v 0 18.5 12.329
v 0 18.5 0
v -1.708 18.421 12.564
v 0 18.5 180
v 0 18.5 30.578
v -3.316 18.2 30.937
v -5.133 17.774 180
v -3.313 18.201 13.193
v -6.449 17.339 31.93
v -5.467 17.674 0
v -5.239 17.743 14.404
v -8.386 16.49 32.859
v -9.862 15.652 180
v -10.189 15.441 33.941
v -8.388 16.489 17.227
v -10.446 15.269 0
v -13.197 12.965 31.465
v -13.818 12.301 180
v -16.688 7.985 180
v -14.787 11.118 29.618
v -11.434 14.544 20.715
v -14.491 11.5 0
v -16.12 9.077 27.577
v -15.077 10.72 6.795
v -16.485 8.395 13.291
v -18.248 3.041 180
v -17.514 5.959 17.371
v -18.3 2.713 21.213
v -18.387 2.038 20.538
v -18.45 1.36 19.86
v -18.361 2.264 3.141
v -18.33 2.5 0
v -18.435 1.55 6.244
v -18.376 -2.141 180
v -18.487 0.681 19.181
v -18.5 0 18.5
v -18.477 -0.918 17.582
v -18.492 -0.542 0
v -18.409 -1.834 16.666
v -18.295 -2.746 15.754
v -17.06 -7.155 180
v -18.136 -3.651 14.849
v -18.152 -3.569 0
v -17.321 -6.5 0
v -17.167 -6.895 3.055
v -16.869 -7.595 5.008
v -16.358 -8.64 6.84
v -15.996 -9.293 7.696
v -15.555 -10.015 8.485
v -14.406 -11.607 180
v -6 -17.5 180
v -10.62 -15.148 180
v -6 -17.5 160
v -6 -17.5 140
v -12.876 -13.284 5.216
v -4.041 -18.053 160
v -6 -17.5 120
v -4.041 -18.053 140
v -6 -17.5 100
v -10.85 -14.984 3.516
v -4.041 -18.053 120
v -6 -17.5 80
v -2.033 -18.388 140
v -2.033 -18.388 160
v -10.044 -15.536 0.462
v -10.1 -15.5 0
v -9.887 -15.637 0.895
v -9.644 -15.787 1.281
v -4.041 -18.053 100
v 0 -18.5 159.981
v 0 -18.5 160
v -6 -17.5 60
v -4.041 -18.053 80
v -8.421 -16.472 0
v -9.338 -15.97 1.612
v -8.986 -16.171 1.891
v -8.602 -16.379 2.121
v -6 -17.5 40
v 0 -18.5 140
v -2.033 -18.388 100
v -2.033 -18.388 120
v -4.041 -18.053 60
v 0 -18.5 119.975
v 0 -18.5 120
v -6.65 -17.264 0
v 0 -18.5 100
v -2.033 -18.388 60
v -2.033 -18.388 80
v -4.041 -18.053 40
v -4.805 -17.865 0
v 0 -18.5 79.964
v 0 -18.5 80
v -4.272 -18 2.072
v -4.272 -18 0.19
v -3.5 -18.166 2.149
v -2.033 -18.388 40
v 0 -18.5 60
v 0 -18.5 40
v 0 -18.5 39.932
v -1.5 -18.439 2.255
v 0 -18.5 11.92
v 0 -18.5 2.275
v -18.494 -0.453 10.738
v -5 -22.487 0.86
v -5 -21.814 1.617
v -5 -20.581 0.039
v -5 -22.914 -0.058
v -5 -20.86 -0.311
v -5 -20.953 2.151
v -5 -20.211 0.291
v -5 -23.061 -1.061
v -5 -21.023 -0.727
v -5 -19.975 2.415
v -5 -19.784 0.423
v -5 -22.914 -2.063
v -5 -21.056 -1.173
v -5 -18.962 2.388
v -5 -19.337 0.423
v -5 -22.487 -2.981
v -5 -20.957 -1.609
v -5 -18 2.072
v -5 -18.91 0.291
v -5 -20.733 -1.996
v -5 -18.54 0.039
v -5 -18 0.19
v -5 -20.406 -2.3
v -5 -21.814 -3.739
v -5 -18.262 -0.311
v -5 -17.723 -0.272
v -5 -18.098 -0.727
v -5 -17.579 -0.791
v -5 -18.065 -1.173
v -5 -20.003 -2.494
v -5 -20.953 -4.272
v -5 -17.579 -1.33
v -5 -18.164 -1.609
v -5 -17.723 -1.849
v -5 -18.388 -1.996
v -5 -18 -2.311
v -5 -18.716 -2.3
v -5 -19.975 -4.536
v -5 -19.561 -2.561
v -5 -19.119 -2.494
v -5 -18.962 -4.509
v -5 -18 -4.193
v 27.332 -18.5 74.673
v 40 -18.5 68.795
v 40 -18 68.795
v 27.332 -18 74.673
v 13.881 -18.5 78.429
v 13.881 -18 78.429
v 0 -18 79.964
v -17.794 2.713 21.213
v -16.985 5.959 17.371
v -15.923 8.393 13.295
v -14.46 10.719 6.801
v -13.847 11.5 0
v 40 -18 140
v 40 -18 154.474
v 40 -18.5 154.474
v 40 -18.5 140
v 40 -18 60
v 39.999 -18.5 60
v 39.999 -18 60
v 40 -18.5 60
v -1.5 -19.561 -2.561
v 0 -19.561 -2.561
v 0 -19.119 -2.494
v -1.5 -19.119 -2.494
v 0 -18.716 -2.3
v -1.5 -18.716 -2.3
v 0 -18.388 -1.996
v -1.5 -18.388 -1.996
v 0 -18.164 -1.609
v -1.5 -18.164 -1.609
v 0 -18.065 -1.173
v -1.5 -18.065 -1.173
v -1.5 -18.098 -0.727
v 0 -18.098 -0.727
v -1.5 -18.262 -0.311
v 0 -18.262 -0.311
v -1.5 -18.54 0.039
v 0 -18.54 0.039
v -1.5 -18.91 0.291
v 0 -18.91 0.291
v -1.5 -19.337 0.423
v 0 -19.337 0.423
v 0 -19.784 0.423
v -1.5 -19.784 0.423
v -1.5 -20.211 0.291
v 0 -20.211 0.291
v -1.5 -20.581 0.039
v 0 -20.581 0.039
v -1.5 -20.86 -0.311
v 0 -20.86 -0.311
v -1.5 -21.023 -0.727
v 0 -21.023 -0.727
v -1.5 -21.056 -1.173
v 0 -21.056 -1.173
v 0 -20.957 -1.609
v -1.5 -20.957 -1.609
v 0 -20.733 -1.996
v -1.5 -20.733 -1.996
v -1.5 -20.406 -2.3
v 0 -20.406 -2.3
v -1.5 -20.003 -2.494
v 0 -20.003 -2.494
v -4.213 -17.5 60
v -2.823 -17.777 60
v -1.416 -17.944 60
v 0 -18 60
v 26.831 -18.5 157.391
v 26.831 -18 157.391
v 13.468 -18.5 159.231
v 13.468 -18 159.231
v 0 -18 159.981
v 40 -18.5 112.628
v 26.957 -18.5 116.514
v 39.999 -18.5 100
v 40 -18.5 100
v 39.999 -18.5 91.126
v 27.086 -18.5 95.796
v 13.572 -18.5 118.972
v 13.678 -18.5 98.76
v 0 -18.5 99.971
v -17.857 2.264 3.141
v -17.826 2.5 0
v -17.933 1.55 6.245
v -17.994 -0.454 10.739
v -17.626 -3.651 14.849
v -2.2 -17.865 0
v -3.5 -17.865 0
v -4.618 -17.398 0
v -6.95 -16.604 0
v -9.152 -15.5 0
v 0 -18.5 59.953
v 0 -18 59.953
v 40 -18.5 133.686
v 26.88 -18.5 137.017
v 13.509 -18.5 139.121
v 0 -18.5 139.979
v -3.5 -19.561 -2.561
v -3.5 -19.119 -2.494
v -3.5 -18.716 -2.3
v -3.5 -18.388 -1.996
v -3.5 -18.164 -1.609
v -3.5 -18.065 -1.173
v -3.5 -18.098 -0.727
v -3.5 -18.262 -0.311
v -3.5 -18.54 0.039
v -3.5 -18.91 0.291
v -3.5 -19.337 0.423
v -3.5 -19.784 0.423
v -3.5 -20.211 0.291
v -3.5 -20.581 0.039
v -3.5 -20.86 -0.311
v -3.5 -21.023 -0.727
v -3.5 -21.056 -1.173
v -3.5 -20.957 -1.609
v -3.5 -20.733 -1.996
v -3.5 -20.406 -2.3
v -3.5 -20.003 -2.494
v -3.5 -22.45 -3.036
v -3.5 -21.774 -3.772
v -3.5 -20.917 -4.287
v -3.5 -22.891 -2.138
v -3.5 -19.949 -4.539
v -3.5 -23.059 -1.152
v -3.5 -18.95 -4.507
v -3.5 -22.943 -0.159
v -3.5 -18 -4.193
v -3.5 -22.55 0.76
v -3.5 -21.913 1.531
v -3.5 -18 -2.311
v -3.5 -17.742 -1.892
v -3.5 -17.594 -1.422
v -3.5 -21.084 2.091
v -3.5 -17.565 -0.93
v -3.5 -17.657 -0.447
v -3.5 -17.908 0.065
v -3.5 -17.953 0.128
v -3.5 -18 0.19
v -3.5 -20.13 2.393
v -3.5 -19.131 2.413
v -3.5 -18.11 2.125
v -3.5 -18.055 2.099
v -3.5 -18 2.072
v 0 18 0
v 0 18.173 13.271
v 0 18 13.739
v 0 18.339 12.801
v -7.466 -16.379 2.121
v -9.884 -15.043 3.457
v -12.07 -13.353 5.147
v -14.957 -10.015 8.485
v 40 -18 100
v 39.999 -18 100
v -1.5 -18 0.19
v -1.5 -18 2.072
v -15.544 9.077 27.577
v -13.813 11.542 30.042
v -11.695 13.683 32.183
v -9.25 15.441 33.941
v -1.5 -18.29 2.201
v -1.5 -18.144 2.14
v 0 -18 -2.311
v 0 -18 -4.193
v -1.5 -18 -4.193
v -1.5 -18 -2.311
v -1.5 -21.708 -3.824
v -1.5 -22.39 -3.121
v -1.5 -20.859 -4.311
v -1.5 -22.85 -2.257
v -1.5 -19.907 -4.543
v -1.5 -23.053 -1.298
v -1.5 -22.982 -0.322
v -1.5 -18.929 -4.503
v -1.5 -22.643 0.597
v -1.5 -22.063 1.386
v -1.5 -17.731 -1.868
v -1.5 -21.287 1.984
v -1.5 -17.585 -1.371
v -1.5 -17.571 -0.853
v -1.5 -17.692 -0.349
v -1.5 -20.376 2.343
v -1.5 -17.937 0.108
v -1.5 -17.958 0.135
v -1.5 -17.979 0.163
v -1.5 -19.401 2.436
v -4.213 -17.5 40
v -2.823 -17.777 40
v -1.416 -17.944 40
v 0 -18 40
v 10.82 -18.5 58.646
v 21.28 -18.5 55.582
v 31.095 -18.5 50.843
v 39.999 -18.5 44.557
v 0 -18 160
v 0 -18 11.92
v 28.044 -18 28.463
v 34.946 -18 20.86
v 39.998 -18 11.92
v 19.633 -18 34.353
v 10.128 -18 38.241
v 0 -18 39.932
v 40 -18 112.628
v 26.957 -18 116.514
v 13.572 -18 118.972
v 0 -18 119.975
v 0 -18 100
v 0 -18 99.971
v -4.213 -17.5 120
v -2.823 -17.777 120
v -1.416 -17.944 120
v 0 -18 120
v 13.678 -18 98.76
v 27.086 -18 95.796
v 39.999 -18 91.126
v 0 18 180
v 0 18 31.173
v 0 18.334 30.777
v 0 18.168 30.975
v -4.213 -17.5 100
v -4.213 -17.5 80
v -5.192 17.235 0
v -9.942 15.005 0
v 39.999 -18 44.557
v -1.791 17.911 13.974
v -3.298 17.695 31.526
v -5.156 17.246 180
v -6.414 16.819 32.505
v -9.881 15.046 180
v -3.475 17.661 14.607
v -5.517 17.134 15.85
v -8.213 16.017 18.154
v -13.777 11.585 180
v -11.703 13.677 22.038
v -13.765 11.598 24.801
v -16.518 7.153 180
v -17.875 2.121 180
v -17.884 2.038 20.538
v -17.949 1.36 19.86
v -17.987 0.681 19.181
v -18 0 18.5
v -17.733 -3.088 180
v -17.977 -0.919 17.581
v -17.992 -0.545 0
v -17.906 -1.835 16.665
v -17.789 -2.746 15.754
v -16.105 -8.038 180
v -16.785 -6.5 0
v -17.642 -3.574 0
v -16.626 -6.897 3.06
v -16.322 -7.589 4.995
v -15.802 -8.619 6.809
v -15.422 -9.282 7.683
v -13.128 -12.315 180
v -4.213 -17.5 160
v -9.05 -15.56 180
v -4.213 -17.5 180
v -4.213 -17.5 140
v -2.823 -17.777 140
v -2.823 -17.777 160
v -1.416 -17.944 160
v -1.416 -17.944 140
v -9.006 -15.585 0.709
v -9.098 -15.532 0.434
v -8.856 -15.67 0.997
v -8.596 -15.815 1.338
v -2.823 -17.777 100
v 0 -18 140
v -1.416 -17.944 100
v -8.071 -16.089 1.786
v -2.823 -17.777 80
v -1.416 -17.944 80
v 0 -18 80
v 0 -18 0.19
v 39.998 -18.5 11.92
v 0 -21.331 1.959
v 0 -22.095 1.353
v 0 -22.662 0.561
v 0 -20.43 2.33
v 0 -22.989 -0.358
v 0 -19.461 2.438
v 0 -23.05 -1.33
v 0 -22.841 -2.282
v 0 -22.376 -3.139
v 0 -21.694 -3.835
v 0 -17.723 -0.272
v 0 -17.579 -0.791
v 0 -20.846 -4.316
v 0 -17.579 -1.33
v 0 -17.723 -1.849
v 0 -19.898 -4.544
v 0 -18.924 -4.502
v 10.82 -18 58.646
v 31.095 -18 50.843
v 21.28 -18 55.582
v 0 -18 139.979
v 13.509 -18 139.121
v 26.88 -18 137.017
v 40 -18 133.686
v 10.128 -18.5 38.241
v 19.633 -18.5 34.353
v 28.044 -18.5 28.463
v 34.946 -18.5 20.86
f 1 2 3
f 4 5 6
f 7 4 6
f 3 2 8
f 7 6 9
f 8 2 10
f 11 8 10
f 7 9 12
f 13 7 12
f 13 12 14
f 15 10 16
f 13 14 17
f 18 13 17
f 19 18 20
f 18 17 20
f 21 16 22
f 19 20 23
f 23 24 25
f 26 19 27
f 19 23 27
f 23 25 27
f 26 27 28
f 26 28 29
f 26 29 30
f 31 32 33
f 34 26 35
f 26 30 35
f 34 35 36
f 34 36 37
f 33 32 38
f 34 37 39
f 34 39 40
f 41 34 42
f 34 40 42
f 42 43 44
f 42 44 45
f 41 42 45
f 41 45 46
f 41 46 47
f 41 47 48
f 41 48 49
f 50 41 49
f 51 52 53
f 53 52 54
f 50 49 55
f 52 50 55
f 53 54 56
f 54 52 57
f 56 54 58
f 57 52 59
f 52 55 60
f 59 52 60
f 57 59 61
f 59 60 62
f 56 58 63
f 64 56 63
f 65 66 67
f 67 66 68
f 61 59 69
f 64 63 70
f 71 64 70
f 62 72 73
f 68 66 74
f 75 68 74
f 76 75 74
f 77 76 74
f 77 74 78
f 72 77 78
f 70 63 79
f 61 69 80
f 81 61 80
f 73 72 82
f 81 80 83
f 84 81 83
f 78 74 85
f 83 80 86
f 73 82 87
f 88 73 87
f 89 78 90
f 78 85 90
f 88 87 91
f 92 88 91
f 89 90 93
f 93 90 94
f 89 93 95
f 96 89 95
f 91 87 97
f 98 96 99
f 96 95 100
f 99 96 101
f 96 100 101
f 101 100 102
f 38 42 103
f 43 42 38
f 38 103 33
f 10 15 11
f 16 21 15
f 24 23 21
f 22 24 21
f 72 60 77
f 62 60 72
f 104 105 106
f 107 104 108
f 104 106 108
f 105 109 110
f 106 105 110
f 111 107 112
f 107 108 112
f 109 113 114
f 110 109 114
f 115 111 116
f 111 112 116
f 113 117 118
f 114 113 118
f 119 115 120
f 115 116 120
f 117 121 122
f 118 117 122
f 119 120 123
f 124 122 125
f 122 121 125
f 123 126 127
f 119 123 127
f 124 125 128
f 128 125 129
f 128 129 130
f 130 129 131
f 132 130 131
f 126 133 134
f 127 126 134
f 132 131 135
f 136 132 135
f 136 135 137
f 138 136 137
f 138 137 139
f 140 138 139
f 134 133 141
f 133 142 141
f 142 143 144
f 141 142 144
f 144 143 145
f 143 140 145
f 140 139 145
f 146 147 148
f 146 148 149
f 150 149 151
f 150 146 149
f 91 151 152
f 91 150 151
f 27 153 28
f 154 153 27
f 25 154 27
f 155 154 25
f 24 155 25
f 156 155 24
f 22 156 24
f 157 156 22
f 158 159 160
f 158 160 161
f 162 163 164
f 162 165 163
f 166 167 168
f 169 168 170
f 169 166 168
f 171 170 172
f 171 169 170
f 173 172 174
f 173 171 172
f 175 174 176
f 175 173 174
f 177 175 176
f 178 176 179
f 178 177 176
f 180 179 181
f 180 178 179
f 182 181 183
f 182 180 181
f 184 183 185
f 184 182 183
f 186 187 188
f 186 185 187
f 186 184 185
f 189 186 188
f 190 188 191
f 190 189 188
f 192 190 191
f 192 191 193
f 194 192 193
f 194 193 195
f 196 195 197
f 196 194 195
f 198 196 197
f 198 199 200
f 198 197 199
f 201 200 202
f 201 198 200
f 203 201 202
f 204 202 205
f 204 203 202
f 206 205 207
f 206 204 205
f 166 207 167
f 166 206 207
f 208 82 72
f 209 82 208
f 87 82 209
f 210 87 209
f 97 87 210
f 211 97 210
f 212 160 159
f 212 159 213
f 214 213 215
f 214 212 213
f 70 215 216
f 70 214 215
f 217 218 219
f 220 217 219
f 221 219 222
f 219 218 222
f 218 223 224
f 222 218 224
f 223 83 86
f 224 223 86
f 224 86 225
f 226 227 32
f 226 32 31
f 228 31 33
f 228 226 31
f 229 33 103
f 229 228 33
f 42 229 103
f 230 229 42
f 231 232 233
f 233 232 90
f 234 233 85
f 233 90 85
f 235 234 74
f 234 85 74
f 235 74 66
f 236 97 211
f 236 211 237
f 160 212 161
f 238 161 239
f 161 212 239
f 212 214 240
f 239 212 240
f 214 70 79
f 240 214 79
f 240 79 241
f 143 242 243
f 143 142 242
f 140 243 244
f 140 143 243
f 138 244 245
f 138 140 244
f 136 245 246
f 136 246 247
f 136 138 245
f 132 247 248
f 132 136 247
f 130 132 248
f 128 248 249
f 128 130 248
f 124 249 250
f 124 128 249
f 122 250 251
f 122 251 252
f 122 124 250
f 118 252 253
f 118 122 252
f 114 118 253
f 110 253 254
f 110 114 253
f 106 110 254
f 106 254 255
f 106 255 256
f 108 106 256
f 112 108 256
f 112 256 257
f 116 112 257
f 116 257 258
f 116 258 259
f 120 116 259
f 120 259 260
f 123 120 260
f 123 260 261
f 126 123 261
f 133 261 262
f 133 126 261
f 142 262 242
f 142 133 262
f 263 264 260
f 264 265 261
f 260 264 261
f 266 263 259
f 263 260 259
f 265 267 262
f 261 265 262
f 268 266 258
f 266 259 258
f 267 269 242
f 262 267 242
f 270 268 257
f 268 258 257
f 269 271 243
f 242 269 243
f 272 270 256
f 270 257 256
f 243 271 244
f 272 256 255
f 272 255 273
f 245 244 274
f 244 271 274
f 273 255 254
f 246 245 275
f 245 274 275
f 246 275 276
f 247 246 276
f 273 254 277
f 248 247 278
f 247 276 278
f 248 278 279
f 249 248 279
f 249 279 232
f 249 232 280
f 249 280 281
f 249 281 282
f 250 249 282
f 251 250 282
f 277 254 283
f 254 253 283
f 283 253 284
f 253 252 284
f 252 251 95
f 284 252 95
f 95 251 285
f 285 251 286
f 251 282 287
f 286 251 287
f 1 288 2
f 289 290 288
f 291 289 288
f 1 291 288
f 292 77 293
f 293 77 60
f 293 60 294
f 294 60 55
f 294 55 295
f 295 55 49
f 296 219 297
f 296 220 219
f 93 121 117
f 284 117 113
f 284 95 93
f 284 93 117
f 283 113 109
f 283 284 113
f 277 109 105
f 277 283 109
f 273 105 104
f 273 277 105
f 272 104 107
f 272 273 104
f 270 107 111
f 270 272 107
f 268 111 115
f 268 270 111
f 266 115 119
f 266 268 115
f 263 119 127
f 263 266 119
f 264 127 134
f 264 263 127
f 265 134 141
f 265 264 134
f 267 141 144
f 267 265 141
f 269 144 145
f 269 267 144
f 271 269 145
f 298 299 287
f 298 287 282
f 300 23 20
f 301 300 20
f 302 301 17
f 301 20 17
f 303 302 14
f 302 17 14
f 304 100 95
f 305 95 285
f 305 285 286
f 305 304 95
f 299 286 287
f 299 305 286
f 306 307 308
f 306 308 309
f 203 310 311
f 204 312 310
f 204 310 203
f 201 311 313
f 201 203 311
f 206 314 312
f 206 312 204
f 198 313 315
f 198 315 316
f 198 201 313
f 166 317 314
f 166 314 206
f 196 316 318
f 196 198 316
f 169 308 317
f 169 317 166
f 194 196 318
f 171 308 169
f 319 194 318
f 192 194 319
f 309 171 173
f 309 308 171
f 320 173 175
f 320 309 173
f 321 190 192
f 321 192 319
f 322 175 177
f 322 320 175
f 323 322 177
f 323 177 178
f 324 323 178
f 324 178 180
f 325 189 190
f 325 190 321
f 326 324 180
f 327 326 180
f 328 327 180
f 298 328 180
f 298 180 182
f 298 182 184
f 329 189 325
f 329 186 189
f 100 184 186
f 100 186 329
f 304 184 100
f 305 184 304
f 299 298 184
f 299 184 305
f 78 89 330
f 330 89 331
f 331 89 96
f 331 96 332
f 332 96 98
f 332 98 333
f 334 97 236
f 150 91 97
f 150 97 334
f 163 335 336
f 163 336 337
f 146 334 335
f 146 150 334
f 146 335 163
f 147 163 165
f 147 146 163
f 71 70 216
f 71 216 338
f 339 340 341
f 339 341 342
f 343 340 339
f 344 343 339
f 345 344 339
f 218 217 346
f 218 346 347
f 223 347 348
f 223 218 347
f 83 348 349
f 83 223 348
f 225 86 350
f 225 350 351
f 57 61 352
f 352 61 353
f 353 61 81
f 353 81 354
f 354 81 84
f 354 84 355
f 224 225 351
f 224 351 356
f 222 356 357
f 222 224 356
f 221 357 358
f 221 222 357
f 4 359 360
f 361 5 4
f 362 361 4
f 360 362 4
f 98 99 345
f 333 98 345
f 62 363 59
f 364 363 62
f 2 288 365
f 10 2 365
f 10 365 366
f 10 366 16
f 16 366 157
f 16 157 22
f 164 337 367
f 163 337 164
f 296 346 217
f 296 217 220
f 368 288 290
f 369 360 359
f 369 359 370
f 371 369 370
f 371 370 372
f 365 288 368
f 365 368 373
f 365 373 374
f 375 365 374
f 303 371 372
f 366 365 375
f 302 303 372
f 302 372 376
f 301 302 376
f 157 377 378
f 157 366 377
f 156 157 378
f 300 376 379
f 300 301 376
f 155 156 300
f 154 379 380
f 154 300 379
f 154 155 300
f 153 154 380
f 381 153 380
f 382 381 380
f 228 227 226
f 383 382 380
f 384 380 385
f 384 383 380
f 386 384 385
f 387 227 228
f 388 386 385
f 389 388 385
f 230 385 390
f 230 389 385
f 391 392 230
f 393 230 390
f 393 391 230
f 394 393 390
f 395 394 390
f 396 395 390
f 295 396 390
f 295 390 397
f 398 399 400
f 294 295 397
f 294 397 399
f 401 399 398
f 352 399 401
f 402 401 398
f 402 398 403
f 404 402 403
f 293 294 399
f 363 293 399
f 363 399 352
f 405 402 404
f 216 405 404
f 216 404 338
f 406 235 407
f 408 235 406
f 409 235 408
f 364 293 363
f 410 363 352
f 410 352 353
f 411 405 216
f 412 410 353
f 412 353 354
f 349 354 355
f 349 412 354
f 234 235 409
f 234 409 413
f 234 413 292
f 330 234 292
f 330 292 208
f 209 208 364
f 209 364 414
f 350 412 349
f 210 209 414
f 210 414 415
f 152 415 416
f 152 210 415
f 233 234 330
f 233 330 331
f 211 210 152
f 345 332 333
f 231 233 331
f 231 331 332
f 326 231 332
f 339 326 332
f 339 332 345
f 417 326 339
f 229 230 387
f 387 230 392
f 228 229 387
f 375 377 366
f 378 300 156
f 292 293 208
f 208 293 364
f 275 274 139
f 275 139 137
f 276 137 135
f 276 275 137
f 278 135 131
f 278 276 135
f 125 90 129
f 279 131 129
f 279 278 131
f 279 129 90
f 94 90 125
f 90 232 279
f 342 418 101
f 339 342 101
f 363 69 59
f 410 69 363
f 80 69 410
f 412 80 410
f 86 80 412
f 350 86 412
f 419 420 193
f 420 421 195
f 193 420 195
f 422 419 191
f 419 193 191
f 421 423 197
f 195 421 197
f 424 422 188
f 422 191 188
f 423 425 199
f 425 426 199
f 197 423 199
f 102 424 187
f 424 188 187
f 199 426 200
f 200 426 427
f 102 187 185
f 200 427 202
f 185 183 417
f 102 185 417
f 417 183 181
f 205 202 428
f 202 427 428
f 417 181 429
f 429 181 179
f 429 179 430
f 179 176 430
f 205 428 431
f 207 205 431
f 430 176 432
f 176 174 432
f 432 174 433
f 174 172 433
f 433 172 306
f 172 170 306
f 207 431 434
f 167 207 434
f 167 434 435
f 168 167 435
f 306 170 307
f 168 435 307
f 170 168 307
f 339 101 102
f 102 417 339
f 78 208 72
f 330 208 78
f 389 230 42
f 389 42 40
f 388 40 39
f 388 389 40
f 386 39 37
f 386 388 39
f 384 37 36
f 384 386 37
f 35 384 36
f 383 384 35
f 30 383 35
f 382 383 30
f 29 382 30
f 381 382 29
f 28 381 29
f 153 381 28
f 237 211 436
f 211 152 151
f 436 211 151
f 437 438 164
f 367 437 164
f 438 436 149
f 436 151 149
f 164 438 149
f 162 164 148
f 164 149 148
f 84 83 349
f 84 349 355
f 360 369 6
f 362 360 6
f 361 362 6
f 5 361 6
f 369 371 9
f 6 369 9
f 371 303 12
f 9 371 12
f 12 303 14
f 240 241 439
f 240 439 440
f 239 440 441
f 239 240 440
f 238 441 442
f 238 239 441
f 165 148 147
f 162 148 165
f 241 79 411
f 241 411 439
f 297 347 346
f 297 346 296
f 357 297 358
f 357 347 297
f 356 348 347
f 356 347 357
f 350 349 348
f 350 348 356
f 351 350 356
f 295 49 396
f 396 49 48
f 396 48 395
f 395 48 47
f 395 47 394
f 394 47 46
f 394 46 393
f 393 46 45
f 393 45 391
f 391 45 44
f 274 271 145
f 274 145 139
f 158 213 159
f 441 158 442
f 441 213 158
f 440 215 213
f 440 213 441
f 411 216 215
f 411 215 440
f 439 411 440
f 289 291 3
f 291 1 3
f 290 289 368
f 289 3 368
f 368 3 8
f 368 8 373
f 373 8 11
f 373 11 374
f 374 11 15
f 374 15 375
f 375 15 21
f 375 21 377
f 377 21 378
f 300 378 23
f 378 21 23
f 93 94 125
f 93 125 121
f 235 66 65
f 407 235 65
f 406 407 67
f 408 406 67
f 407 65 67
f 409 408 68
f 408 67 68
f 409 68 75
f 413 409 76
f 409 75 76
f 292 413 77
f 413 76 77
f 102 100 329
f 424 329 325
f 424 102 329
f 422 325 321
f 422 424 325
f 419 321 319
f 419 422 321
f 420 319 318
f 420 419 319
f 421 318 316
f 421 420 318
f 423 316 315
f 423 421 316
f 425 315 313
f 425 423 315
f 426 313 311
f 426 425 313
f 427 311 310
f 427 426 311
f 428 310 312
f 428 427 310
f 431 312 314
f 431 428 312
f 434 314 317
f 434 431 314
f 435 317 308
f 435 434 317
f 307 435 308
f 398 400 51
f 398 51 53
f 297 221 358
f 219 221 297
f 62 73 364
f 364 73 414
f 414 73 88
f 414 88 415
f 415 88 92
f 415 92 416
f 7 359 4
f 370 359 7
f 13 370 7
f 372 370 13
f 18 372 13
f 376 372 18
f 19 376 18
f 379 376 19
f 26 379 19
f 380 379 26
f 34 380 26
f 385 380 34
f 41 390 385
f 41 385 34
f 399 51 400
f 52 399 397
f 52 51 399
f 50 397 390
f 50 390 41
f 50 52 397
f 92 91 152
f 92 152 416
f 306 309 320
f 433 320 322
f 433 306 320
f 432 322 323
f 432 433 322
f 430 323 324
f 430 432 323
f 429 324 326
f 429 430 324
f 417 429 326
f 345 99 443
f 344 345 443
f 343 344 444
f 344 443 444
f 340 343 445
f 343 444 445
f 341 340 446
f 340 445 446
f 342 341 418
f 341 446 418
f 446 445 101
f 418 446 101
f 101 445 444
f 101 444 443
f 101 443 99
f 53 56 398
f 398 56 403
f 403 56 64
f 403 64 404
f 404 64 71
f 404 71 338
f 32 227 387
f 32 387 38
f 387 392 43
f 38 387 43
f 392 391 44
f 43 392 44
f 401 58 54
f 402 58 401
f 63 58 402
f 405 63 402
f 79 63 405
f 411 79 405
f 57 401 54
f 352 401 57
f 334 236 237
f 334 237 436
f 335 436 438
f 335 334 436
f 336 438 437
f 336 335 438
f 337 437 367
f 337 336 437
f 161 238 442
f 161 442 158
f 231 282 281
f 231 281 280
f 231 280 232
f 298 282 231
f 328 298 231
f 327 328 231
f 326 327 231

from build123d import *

# Parameters (mm, degrees)
SKETCH_1_R           = 18.5
SKETCH_1_R_2         = 18
EXTRUDE_1_DEPTH      = 180
CUT_EXTRUDE_1_DEPTH  = 30
SKETCH_5_R           = 1.5
EXTRUDE_2_DEPTH      = 5
SKETCH_8_R           = 1.5
CUT_EXTRUDE_2_DEPTH  = 2
SKETCH_9_R           = 1.5
CUT_EXTRUDE_3_DEPTH  = 2
SKETCH_12_W          = 21.543450216
SKETCH_12_H          = 50.101047014
CUT_EXTRUDE_4_DEPTH  = 201
SKETCH_13_W          = 20
SKETCH_13_H          = 0.5
EXTRUDE_3_DEPTH      = 40
SKETCH_14_W          = 20
SKETCH_14_H          = 1
CUT_EXTRUDE_5_DEPTH  = 40
EXTRUDE_4_DEPTH      = 0.5
CUT_EXTRUDE_25_DEPTH = 0.5
CUT_EXTRUDE_26_DEPTH = 0.5
CUT_EXTRUDE_27_DEPTH = 0.5


with BuildPart() as part:
    # 草图1 → 凸台-拉伸1 (new body)
    with BuildSketch(Plane.XY):
        with Locations(Location((0, 0, 0), (0, 0, 180))):
            Circle(SKETCH_1_R)
        with Locations(Location((0, 0, 0), (0, 0, 180))):
            Circle(SKETCH_1_R_2, mode=Mode.SUBTRACT)
    extrude(amount=EXTRUDE_1_DEPTH)

    # 草图4 → 切除-拉伸1 (cut, symmetric)
    with BuildSketch(Plane(origin=(0, 0, 0), x_dir=(0, 0, -1), z_dir=(1, 0, 0))):
        with BuildLine():
            Line((-2.121320344, -16.378679656), (-8.485281374, -10.014718626))
            ThreePointArc((-8.485281374, -10.014718626), (-4.592201188, -7.41344561), (0, -6.5))
            Line((0, -6.5), (0, -15.5))
            ThreePointArc((0, -15.5), (-1.148050297, -15.728361402), (-2.121320344, -16.378679656))
        make_face()
        with BuildLine():
            Line((-23.744748589, 23.215547635), (0, 23.215547635))
            Line((0, 23.215547635), (0, 20.5))
            ThreePointArc((0, 20.5), (-14.924653862, 17.531301768), (-27.577164466, 9.077164466))
            Line((-27.577164466, 9.077164466), (-33.941125497, 15.441125497))
            ThreePointArc((-33.941125497, 15.441125497), (-29.103701262, 19.670336295), (-23.744748589, 23.215547635))
        make_face()
        with BuildLine():
            Line((-14.849242405, -3.650757595), (-21.213203436, 2.713203436))
            ThreePointArc((-21.213203436, 2.713203436), (-11.480502971, 9.216385975), (0, 11.5))
            Line((0, 11.5), (0, 2.5))
            ThreePointArc((0, 2.5), (-8.03635208, 0.901470183), (-14.849242405, -3.650757595))
        make_face()
    extrude(amount=CUT_EXTRUDE_1_DEPTH, both=True, mode=Mode.SUBTRACT)

    # 草图5 → 凸台-拉伸2 (add, symmetric)
    with BuildSketch(Plane(origin=(0, 0, 0), x_dir=(0, 0, -1), z_dir=(1, 0, 0))):
        with BuildLine():
            Line((-0.190075543, -18), (-2.072124505, -18))
            ThreePointArc((-2.072124505, -18), (1.060660172, -23.060660172), (4.193444848, -18))
            Line((4.193444848, -18), (2.311395887, -18))
            ThreePointArc((2.311395887, -18), (1.060660172, -17.560660172), (-0.190075543, -18))
        make_face()
        with Locations((1.060660172, -19.560660172)):
            Circle(SKETCH_5_R, mode=Mode.SUBTRACT)
    extrude(amount=EXTRUDE_2_DEPTH, both=True)

    # 草图8 → 切除-拉伸2 (cut)
    with BuildSketch(Plane(origin=(3.5, 0, 0), x_dir=(0, 0, -1), z_dir=(1, 0, 0))):
        with BuildLine():
            Line((-0.190075543, -18), (-2.072124505, -18))
            ThreePointArc((-2.072124505, -18), (1.060660172, -23.060660172), (4.193444848, -18))
            Line((4.193444848, -18), (2.311395887, -18))
            ThreePointArc((2.311395887, -18), (1.060660172, -17.560660172), (-0.190075543, -18))
        make_face()
        with Locations((1.060660172, -19.560660172)):
            Circle(SKETCH_8_R, mode=Mode.SUBTRACT)
    extrude(amount=-CUT_EXTRUDE_2_DEPTH, mode=Mode.SUBTRACT)

    # 草图9 → 切除-拉伸3 (cut)
    with BuildSketch(Plane(origin=(-1.5, 0, 0), x_dir=(0, 0, -1), z_dir=(1, 0, 0))):
        with BuildLine():
            Line((-2.072124505, -18), (-0.190075543, -18))
            ThreePointArc((-0.190075543, -18), (1.060660172, -17.560660172), (2.311395887, -18))
            Line((2.311395887, -18), (4.193444848, -18))
            ThreePointArc((4.193444848, -18), (1.060660172, -23.060660172), (-2.072124505, -18))
        make_face()
        with Locations((1.060660172, -19.560660172)):
            Circle(SKETCH_9_R, mode=Mode.SUBTRACT)
    extrude(amount=-CUT_EXTRUDE_3_DEPTH, mode=Mode.SUBTRACT)

    # 草图12 → 切除-拉伸4 (cut, symmetric)
    with BuildSketch(Plane(origin=(0, 0, 0), x_dir=(-1, 0, 0), z_dir=(0, 0, -1))):
        with Locations((-10.771725108, -0.713406874)):
            Rectangle(SKETCH_12_W, SKETCH_12_H)
    extrude(amount=CUT_EXTRUDE_4_DEPTH, both=True, mode=Mode.SUBTRACT)

    # 草图13 → 凸台-拉伸3 (add)
    with BuildSketch(Plane(origin=(0, 0, 0), x_dir=(0, 0, -1), z_dir=(1, 0, 0))):
        with Locations((-110, -18.25)):
            Rectangle(SKETCH_13_W, SKETCH_13_H)
        with Locations((-70, -18.25)):
            Rectangle(SKETCH_13_W, SKETCH_13_H)
        with Locations((-150, -18.25)):
            Rectangle(SKETCH_13_W, SKETCH_13_H)
    extrude(amount=EXTRUDE_3_DEPTH)

    # 草图14 → 切除-拉伸5 (cut)
    with BuildSketch(Plane(origin=(0, 0, 0), x_dir=(0, 0, -1), z_dir=(1, 0, 0))):
        with Locations((-90, -18)):
            Rectangle(SKETCH_14_W, SKETCH_14_H)
        with Locations((-50, -18)):
            Rectangle(SKETCH_14_W, SKETCH_14_H)
        with Locations((-130, -18)):
            Rectangle(SKETCH_14_W, SKETCH_14_H)
        with Locations((-170, -18)):
            Rectangle(SKETCH_14_W, SKETCH_14_H)
    extrude(amount=-CUT_EXTRUDE_5_DEPTH, mode=Mode.SUBTRACT)

    # 草图16 → 凸台-拉伸4 (add)
    with BuildSketch(Plane.XZ.offset(18.5)):
        with BuildLine():
            Line((39.998675576, 44.557290849), (39.998953647, 68.795192772))
            ThreePointArc((39.998953647, 68.795192772), (20.682117379, 76.824270149), (0, 79.963739473))
            Line((0, 79.963739473), (0, 59.952777719))
            ThreePointArc((0, 59.952777719), (21.279727814, 55.581587428), (39.998675576, 44.557290849))
        make_face()
        with BuildLine():
            Line((0, 11.92), (0, 39.932309719))
            ThreePointArc((0, 39.932309719), (24.002531018, 31.642513786), (39.998301143, 11.92))
            Line((39.998301143, 11.92), (0, 11.92))
        make_face()
        with BuildLine():
            Line((0, 159.981196289), (0, 139.978623608))
            ThreePointArc((0, 139.978623608), (20.218739097, 138.224024642), (39.999698116, 133.686438442))
            Line((39.999698116, 133.686438442), (39.999936605, 154.474190176))
            ThreePointArc((39.999936605, 154.474190176), (20.167826378, 158.446924196), (0, 159.981196289))
        make_face()
        with BuildLine():
            Line((39.999209833, 91.125521645), (39.999456529, 112.628600071))
            ThreePointArc((39.999456529, 112.628600071), (20.297610274, 117.92376471), (0, 119.975235288))
            Line((0, 119.975235288), (0, 99.97057031))
            ThreePointArc((0, 99.97057031), (20.430131767, 97.494980868), (39.999209833, 91.125521645))
        make_face()
    extrude(amount=-EXTRUDE_4_DEPTH)

    # 草图20 → 切除-拉伸25 (cut)
    with BuildSketch(Plane.XZ.offset(18.5)):
        with BuildLine():
            Line((40, 80), (40, 68.794599806))
            ThreePointArc((40, 68.794599806), (20.682696569, 76.824108425), (0, 79.963739473))
            Line((0, 79.963739473), (0, 80))
            Line((0, 80), (40, 80))
        make_face()
    extrude(amount=-CUT_EXTRUDE_25_DEPTH, mode=Mode.SUBTRACT)

    # 草图22 → 切除-拉伸26 (cut)
    with BuildSketch(Plane.XZ.offset(18.5)):
        with BuildLine():
            Line((40, 120), (40, 112.628405695))
            ThreePointArc((40, 112.628405695), (20.297894119, 117.923712576), (0, 119.975235288))
            Line((0, 119.975235288), (0, 120))
            Line((0, 120), (40, 120))
        make_face()
    extrude(amount=-CUT_EXTRUDE_26_DEPTH, mode=Mode.SUBTRACT)

    # 草图23 → 切除-拉伸27 (cut)
    with BuildSketch(Plane.XZ.offset(18.5)):
        with BuildLine():
            Line((40, 160), (40, 154.474173407))
            ThreePointArc((40, 154.474173407), (20.167858859, 158.446919724), (0, 159.981196289))
            Line((0, 159.981196289), (0, 160))
            Line((0, 160), (40, 160))
        make_face()
    extrude(amount=-CUT_EXTRUDE_27_DEPTH, mode=Mode.SUBTRACT)


solid = part.part
